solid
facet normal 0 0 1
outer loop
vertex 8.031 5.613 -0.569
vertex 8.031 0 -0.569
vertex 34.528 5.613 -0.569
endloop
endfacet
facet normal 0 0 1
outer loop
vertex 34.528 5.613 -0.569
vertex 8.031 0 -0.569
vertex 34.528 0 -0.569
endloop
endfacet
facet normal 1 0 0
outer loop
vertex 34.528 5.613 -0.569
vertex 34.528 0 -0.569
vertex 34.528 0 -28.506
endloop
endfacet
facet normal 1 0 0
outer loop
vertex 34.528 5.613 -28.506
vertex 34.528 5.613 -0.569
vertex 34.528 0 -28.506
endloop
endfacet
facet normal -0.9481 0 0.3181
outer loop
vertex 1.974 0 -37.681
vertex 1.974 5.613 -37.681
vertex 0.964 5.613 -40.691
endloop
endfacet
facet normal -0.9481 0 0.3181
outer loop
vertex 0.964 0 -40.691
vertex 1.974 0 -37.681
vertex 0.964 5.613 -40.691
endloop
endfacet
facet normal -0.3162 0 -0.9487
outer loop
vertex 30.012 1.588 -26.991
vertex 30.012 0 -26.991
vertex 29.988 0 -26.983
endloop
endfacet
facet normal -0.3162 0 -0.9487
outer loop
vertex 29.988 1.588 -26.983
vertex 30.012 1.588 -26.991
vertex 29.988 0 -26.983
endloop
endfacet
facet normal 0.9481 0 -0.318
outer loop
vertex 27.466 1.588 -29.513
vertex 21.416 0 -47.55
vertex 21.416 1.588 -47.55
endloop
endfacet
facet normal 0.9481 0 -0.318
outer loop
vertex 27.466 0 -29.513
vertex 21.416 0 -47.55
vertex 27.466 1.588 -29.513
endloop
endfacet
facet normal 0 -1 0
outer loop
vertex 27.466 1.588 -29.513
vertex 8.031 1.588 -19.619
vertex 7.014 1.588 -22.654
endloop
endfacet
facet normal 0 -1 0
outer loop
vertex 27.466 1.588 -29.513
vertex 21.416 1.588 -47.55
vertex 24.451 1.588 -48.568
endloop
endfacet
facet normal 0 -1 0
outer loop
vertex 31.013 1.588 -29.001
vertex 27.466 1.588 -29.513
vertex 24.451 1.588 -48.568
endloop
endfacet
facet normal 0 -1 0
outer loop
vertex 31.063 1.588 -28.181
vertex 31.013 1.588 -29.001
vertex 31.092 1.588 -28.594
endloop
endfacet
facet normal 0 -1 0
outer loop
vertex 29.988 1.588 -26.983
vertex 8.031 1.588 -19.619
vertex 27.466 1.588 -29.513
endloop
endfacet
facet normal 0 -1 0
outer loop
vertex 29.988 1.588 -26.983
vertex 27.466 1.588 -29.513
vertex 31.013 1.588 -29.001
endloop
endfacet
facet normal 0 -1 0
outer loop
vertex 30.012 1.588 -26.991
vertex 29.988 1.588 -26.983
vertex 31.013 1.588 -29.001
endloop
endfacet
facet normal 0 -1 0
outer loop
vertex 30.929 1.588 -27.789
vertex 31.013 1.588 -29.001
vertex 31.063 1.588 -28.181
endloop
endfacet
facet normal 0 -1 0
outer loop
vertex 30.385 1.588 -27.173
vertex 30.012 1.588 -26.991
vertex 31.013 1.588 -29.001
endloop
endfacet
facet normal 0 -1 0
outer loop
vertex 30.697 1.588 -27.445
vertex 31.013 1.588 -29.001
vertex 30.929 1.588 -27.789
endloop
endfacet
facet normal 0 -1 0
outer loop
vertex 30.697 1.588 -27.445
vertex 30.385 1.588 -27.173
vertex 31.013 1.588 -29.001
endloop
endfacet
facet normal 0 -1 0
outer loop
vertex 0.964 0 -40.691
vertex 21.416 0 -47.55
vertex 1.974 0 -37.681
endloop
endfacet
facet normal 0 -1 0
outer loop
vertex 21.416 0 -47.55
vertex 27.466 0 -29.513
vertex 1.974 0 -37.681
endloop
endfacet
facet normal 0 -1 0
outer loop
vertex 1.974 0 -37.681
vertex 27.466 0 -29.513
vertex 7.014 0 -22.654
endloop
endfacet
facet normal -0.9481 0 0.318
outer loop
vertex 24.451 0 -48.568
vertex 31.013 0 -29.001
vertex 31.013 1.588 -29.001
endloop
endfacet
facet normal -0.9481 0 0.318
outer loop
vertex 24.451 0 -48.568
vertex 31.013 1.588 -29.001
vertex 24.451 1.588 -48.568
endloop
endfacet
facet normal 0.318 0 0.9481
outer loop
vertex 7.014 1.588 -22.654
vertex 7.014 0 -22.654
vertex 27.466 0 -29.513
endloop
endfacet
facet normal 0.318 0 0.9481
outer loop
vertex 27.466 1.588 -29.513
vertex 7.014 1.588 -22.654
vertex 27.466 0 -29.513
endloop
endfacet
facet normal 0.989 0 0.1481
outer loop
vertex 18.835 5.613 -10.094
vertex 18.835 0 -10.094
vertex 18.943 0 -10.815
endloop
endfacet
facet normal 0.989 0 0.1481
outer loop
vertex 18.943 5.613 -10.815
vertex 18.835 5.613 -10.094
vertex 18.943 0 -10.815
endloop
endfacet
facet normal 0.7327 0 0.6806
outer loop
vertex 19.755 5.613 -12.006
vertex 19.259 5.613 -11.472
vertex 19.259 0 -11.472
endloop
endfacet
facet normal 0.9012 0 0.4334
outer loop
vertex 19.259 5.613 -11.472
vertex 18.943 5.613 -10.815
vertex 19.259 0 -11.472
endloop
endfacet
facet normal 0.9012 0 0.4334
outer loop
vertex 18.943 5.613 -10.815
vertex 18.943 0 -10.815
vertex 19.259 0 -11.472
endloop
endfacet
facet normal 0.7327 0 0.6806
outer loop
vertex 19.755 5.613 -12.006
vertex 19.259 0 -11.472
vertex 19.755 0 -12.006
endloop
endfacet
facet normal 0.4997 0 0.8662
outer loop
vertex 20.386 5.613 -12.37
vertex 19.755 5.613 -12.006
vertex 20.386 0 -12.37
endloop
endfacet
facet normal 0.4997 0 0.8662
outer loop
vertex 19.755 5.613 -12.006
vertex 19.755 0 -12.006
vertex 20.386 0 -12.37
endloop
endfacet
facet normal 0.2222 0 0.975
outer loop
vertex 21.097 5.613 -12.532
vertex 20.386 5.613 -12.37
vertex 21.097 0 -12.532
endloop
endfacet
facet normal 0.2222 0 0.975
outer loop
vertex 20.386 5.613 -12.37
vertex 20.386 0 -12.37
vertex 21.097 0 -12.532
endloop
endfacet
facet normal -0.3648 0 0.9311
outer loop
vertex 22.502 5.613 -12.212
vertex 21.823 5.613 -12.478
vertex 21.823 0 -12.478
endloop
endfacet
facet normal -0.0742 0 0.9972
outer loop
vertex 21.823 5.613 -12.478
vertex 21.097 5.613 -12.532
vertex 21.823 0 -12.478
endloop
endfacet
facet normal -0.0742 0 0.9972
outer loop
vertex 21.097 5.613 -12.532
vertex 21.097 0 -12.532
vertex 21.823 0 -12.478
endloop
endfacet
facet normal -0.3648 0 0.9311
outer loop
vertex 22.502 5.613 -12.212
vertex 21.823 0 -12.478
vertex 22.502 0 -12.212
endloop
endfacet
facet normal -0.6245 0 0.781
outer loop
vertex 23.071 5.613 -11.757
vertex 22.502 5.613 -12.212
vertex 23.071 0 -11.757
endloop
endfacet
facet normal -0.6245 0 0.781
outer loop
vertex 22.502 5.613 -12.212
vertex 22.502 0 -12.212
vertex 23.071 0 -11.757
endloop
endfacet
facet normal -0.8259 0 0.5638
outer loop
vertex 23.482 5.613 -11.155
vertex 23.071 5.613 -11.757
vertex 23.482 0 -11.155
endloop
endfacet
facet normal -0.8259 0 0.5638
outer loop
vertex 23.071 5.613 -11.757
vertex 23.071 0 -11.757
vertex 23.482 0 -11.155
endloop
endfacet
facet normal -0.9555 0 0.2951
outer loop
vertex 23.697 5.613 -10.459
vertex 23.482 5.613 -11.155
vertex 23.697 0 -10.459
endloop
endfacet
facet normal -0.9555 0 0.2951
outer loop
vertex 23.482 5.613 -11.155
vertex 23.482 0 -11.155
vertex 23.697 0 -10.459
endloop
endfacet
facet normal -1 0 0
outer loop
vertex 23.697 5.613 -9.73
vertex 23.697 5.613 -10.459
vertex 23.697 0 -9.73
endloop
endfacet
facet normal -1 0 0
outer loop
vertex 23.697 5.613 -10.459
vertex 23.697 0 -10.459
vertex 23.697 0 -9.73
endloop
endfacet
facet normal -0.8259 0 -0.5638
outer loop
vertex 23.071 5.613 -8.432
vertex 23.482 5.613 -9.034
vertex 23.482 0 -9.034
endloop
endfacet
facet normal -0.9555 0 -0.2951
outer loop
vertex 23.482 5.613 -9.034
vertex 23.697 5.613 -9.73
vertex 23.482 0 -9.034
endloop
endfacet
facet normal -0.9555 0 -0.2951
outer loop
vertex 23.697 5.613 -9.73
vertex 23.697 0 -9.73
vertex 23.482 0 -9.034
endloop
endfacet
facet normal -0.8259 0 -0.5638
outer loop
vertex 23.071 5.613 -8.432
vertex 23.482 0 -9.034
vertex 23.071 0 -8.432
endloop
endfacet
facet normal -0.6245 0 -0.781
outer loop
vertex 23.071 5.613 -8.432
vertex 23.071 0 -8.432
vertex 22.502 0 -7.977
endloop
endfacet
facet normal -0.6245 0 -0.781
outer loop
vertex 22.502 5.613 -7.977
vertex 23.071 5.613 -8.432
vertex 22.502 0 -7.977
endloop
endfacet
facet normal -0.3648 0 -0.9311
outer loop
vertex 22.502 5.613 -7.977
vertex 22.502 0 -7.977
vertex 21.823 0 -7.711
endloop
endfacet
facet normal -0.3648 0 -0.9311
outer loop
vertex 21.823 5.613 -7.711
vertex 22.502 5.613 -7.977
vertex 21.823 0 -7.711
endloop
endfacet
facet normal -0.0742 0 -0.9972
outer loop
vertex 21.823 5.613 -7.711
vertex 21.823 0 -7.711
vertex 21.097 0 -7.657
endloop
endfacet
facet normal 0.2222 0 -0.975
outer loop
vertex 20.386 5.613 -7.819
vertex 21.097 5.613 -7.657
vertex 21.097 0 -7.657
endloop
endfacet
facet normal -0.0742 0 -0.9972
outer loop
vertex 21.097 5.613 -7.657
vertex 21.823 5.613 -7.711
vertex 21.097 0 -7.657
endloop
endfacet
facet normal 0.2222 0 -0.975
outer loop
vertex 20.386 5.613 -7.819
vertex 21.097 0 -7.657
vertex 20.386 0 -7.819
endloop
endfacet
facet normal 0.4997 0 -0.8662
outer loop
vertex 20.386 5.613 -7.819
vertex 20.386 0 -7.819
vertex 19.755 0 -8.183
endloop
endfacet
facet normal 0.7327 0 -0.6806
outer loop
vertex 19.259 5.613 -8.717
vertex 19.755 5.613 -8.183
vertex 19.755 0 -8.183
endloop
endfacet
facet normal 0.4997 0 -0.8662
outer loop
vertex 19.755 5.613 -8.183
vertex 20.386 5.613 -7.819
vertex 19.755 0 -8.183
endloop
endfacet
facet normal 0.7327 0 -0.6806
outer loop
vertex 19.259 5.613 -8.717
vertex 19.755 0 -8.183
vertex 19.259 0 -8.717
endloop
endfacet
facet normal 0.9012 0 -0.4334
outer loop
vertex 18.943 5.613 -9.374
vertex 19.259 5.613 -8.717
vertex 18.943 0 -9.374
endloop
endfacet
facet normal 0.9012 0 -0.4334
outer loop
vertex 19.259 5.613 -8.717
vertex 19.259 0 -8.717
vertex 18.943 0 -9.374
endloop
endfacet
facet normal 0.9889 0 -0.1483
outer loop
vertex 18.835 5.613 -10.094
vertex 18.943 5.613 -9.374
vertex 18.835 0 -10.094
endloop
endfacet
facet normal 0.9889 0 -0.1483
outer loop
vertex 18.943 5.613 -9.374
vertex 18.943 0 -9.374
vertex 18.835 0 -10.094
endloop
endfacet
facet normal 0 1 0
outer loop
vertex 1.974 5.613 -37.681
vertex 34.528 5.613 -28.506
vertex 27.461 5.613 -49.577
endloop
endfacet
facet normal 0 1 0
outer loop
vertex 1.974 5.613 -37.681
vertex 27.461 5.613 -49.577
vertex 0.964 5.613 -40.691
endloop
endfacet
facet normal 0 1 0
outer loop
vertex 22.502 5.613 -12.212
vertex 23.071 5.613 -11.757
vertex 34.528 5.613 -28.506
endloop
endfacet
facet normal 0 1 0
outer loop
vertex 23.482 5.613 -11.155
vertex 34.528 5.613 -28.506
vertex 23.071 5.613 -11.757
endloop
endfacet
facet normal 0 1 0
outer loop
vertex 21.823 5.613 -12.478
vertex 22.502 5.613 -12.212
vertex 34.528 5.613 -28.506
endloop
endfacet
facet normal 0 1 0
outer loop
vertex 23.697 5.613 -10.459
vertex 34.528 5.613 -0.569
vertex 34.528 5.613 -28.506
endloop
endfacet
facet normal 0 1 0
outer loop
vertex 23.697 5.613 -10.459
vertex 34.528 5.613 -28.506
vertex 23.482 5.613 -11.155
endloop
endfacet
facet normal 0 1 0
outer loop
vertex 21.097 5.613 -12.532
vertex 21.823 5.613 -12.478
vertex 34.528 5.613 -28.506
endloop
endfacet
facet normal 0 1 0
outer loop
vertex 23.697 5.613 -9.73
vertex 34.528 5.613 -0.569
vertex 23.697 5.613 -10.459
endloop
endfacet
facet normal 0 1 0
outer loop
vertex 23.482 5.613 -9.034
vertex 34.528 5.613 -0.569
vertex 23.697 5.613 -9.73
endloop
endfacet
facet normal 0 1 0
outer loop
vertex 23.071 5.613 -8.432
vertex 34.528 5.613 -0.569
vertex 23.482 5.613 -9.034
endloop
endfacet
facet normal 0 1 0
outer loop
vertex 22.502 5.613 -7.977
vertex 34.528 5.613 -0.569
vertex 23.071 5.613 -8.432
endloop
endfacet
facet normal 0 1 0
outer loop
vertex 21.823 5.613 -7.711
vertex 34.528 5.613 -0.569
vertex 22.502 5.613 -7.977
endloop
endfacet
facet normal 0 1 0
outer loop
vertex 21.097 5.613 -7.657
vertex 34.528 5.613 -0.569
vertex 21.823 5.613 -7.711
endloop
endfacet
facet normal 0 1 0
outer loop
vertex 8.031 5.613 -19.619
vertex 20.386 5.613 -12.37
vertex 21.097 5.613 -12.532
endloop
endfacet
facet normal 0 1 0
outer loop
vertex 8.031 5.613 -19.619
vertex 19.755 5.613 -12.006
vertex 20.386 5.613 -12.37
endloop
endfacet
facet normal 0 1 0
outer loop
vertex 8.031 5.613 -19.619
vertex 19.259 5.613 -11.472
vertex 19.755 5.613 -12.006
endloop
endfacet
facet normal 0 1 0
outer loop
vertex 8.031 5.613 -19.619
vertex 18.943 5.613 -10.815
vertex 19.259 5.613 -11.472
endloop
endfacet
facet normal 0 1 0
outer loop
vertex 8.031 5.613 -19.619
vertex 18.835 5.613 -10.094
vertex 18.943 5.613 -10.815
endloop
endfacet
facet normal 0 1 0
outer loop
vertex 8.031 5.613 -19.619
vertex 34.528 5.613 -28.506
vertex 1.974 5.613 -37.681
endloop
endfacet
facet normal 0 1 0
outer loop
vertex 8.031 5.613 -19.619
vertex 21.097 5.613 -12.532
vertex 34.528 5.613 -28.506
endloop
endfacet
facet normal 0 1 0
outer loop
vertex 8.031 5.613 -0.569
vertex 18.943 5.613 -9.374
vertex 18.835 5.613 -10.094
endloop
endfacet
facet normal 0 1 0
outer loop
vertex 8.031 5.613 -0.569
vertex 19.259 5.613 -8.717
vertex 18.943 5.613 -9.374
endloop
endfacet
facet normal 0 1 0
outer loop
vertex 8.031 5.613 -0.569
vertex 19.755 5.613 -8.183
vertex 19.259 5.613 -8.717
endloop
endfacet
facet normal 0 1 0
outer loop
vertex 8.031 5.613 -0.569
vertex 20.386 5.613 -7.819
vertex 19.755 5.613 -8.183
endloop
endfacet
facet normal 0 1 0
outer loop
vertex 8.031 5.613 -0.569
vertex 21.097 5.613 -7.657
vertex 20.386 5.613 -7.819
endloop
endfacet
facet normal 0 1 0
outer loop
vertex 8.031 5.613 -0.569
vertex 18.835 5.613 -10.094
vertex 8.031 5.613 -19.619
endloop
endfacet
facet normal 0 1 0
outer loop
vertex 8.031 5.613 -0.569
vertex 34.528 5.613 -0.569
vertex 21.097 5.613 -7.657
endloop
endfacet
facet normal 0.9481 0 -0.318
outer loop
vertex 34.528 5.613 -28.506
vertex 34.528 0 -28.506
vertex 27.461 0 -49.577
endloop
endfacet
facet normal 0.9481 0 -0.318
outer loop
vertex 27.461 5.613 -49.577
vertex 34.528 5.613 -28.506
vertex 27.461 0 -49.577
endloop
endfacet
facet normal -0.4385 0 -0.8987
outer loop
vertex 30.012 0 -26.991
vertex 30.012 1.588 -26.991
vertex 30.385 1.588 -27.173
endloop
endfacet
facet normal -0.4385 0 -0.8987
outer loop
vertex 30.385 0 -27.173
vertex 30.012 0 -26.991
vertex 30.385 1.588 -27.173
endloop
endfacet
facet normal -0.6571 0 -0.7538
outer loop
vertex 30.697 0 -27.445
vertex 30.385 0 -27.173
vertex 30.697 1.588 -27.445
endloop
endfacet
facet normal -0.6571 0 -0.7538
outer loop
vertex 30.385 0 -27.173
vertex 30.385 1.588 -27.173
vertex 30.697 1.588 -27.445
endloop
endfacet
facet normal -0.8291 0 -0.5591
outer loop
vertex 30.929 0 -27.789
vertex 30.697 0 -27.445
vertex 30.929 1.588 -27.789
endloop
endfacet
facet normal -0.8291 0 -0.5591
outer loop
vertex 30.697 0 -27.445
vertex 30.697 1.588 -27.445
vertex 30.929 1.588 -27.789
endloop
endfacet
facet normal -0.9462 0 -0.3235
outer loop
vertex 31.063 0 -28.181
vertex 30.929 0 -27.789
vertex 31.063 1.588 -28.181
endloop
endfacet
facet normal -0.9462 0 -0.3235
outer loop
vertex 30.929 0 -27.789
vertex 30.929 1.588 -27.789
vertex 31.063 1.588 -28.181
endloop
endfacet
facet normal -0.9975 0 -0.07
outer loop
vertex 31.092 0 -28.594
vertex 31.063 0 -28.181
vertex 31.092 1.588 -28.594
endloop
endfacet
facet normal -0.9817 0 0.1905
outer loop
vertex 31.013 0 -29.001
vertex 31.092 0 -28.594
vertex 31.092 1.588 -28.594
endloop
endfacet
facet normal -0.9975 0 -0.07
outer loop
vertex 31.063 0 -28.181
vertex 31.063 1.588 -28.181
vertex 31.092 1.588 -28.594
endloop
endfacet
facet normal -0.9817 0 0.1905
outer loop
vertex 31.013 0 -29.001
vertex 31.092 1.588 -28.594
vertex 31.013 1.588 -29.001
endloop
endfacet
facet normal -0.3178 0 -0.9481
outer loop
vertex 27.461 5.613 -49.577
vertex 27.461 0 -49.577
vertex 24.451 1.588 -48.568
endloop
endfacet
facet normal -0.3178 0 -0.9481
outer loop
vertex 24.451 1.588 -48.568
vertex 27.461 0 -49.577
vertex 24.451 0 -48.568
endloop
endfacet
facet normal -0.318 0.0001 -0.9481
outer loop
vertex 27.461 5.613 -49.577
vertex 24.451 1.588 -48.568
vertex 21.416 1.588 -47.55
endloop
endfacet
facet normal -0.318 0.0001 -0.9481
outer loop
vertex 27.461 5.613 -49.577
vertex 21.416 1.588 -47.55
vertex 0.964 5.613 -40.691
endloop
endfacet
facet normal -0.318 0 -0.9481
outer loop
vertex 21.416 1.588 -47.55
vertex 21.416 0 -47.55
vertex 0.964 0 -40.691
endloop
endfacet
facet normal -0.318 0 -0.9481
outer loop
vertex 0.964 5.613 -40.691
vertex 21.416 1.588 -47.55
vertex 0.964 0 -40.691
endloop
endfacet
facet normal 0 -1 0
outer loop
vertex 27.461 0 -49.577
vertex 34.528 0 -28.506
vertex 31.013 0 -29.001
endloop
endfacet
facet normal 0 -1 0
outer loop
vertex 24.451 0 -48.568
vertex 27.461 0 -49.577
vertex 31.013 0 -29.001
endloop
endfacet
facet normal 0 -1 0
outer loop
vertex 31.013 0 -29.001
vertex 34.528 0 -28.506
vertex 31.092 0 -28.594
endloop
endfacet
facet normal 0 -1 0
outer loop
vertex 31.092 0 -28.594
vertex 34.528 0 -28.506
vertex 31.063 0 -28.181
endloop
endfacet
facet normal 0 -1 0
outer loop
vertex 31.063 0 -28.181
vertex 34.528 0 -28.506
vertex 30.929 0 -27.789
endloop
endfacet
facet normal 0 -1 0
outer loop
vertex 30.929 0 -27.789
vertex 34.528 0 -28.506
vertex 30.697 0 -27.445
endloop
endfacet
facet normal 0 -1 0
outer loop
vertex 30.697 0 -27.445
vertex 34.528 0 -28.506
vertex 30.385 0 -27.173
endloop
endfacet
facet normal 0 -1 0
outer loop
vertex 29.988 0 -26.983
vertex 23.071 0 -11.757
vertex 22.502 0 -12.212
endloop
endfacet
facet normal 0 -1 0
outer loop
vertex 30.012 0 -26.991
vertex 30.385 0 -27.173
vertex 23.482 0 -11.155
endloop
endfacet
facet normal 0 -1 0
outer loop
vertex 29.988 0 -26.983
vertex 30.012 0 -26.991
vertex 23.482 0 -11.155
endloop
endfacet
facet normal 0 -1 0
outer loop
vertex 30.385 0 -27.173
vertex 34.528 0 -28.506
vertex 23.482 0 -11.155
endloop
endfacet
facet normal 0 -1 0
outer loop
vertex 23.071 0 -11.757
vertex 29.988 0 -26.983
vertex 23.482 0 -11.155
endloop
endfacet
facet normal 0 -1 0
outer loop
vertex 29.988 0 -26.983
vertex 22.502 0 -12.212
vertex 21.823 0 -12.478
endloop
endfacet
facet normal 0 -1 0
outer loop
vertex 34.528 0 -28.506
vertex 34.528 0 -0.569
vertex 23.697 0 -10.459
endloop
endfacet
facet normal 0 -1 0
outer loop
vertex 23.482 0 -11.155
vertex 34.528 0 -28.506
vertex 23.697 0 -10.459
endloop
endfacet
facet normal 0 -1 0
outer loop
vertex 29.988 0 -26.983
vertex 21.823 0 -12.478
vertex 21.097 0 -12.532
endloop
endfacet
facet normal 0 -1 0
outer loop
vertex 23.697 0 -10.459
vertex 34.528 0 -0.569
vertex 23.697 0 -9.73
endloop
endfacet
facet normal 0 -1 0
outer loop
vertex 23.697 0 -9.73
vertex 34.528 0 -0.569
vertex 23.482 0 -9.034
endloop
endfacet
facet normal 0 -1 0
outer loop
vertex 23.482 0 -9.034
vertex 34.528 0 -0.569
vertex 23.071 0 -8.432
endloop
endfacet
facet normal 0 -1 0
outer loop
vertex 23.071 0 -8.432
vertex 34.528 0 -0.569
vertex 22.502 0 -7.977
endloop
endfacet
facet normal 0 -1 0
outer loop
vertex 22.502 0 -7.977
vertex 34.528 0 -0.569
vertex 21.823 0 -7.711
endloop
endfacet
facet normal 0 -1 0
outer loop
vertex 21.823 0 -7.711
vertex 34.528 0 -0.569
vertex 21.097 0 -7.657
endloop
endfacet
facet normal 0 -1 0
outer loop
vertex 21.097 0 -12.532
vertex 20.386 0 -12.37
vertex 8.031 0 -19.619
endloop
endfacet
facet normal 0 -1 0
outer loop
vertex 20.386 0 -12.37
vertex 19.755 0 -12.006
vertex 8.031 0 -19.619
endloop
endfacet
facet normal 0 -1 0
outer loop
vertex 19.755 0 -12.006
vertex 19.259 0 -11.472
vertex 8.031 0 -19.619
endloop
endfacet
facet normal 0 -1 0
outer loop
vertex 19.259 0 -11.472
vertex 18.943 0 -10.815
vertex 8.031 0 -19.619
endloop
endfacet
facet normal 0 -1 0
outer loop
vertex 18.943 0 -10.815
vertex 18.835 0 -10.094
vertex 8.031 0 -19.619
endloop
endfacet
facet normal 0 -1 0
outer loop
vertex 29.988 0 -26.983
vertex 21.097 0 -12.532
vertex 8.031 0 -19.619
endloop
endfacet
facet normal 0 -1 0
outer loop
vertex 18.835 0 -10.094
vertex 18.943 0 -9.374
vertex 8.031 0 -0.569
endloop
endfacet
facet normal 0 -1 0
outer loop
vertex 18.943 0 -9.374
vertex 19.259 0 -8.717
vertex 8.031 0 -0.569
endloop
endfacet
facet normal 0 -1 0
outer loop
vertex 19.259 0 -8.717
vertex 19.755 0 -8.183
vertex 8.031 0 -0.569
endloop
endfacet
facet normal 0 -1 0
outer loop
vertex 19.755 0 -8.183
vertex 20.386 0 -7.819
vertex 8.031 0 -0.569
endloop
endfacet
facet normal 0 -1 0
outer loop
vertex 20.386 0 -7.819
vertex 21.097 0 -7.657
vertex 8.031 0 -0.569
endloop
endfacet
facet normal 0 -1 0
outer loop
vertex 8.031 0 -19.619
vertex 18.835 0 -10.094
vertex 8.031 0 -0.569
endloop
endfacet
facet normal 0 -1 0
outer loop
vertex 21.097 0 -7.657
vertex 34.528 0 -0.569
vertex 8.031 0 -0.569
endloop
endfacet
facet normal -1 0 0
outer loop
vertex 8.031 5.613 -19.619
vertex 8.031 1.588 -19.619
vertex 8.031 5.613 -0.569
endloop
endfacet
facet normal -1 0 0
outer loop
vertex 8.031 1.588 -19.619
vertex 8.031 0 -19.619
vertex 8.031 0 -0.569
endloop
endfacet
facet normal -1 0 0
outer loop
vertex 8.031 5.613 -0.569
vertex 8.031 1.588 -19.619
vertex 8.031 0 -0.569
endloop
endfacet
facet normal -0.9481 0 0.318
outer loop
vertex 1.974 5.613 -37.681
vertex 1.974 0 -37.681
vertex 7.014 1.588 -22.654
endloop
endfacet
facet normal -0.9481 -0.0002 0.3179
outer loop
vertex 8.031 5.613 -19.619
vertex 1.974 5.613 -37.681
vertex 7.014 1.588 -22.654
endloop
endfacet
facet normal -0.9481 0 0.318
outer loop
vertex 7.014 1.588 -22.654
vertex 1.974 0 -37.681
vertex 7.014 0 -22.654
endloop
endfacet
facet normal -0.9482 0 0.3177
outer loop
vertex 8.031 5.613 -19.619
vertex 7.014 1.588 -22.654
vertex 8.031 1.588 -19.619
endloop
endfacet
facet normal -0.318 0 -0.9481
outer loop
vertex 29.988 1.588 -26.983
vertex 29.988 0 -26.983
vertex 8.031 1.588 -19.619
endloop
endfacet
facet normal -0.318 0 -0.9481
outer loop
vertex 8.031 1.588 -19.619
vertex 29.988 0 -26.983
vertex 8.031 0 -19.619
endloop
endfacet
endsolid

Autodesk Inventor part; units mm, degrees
ref_plane "YZ Plane" through (0, 0, 0) normal (1, 0, 0) x (0, 1, 0)
ref_plane "XZ Plane" through (0, 0, 0) normal (0, 1, 0) x (-1, 0, 0)
ref_plane "XY Plane" through (0, 0, 0) normal (0, 0, 1) x (1, 0, 0)
sketch "Sketch1" plane through (0, 0, 0) normal (0, 1, 0) x (-1, 0, 0)
  line L0 (-8.0312, -19.6194) -> (-8.0312, -0.5694)
  line L1 (-8.0312, -0.5694) -> (-34.5277, -0.5694)
  line L2 (-34.5277, -0.5694) -> (-34.5277, -28.5056)
  line L3 (18.6455, 5.0782) -> (18.6456, 5.0782)
  line L4 (-1.974, -37.6808) -> (-8.0312, -19.6194)
  line L5 (-34.5277, -28.5056) -> (-27.4611, -49.5771)
  line L6 (-1.974, -37.6808) -> (-0.9645, -40.691)
  line L7 (-27.4611, -49.5771) -> (-0.9645, -40.691)
  circle A0 centre (-21.2794, -10.0945) radius 2.4447
  line L8 (-8.0312, -0.5694) -> (-8.0312, -19.6194)
  line L9 (-8.0312, -19.6194) -> (-0.9645, -40.691)
  line L10 (-0.9645, -40.691) -> (-27.4611, -49.5771)
  line L11 (-27.4611, -49.5771) -> (-34.5277, -28.5056)
  line L12 (-34.5277, -28.5056) -> (-34.5277, -0.5694)
  line L13 (-34.5277, -0.5694) -> (-8.0312, -0.5694)
  dimension "d0" = 19.05
  dimension "d1" = 22.225
  dimension "d2" = 27.9469
  dimension "d3" = 26.4965
  dimension "d4" = 4.8895
  dimension "d18" = 13.2483
  dimension "d19" = 9.525
  dimension "d20" = 161.46
extrude "Extrusion1" add sketch "Sketch1" along normal blind 5.6134
sketch "Sketch2" plane through (0, 0, 0) normal (0, -1, 0) x (1, 0, 0)
  line L0 (27.4611, -49.5771) -> (0.9645, -40.691) projected
  line L1 (31.5175, -27.4959) -> (29.9883, -26.9832)
  line L2 (34.5277, -28.5056) -> (27.4611, -49.5771) projected
  line L3 (27.4611, -49.5771) -> (0.9645, -40.691) projected
  line L4 (31.5175, -27.4959) -> (8.0312, -19.6194)
  line L5 (8.0312, -19.6194) -> (7.0136, -22.6537)
  line L6 (7.0136, -22.6537) -> (27.4656, -29.5126)
  line L7 (24.4508, -48.5675) -> (21.4165, -47.5499)
  line L8 (21.4165, -47.5499) -> (27.4656, -29.5126)
  line L9 (29.9883, -26.9831) -> (31.5175, -27.4959)
  line L10 (31.5175, -27.4959) -> (24.4508, -48.5675)
  point P0 (0, 0)
  dimension "d15" = 3.2004
  dimension "d16" = 3.175
  dimension "d17" = 3.2004
extrude "Extrusion2" cut sketch "Sketch2" against normal blind 1.5875
fillet "Fillet1" radius 1.5875 1 edges at (31.5175, 0.7937, -27.4959)
properties part number "Lidar Sensor CAse Piece 1"
